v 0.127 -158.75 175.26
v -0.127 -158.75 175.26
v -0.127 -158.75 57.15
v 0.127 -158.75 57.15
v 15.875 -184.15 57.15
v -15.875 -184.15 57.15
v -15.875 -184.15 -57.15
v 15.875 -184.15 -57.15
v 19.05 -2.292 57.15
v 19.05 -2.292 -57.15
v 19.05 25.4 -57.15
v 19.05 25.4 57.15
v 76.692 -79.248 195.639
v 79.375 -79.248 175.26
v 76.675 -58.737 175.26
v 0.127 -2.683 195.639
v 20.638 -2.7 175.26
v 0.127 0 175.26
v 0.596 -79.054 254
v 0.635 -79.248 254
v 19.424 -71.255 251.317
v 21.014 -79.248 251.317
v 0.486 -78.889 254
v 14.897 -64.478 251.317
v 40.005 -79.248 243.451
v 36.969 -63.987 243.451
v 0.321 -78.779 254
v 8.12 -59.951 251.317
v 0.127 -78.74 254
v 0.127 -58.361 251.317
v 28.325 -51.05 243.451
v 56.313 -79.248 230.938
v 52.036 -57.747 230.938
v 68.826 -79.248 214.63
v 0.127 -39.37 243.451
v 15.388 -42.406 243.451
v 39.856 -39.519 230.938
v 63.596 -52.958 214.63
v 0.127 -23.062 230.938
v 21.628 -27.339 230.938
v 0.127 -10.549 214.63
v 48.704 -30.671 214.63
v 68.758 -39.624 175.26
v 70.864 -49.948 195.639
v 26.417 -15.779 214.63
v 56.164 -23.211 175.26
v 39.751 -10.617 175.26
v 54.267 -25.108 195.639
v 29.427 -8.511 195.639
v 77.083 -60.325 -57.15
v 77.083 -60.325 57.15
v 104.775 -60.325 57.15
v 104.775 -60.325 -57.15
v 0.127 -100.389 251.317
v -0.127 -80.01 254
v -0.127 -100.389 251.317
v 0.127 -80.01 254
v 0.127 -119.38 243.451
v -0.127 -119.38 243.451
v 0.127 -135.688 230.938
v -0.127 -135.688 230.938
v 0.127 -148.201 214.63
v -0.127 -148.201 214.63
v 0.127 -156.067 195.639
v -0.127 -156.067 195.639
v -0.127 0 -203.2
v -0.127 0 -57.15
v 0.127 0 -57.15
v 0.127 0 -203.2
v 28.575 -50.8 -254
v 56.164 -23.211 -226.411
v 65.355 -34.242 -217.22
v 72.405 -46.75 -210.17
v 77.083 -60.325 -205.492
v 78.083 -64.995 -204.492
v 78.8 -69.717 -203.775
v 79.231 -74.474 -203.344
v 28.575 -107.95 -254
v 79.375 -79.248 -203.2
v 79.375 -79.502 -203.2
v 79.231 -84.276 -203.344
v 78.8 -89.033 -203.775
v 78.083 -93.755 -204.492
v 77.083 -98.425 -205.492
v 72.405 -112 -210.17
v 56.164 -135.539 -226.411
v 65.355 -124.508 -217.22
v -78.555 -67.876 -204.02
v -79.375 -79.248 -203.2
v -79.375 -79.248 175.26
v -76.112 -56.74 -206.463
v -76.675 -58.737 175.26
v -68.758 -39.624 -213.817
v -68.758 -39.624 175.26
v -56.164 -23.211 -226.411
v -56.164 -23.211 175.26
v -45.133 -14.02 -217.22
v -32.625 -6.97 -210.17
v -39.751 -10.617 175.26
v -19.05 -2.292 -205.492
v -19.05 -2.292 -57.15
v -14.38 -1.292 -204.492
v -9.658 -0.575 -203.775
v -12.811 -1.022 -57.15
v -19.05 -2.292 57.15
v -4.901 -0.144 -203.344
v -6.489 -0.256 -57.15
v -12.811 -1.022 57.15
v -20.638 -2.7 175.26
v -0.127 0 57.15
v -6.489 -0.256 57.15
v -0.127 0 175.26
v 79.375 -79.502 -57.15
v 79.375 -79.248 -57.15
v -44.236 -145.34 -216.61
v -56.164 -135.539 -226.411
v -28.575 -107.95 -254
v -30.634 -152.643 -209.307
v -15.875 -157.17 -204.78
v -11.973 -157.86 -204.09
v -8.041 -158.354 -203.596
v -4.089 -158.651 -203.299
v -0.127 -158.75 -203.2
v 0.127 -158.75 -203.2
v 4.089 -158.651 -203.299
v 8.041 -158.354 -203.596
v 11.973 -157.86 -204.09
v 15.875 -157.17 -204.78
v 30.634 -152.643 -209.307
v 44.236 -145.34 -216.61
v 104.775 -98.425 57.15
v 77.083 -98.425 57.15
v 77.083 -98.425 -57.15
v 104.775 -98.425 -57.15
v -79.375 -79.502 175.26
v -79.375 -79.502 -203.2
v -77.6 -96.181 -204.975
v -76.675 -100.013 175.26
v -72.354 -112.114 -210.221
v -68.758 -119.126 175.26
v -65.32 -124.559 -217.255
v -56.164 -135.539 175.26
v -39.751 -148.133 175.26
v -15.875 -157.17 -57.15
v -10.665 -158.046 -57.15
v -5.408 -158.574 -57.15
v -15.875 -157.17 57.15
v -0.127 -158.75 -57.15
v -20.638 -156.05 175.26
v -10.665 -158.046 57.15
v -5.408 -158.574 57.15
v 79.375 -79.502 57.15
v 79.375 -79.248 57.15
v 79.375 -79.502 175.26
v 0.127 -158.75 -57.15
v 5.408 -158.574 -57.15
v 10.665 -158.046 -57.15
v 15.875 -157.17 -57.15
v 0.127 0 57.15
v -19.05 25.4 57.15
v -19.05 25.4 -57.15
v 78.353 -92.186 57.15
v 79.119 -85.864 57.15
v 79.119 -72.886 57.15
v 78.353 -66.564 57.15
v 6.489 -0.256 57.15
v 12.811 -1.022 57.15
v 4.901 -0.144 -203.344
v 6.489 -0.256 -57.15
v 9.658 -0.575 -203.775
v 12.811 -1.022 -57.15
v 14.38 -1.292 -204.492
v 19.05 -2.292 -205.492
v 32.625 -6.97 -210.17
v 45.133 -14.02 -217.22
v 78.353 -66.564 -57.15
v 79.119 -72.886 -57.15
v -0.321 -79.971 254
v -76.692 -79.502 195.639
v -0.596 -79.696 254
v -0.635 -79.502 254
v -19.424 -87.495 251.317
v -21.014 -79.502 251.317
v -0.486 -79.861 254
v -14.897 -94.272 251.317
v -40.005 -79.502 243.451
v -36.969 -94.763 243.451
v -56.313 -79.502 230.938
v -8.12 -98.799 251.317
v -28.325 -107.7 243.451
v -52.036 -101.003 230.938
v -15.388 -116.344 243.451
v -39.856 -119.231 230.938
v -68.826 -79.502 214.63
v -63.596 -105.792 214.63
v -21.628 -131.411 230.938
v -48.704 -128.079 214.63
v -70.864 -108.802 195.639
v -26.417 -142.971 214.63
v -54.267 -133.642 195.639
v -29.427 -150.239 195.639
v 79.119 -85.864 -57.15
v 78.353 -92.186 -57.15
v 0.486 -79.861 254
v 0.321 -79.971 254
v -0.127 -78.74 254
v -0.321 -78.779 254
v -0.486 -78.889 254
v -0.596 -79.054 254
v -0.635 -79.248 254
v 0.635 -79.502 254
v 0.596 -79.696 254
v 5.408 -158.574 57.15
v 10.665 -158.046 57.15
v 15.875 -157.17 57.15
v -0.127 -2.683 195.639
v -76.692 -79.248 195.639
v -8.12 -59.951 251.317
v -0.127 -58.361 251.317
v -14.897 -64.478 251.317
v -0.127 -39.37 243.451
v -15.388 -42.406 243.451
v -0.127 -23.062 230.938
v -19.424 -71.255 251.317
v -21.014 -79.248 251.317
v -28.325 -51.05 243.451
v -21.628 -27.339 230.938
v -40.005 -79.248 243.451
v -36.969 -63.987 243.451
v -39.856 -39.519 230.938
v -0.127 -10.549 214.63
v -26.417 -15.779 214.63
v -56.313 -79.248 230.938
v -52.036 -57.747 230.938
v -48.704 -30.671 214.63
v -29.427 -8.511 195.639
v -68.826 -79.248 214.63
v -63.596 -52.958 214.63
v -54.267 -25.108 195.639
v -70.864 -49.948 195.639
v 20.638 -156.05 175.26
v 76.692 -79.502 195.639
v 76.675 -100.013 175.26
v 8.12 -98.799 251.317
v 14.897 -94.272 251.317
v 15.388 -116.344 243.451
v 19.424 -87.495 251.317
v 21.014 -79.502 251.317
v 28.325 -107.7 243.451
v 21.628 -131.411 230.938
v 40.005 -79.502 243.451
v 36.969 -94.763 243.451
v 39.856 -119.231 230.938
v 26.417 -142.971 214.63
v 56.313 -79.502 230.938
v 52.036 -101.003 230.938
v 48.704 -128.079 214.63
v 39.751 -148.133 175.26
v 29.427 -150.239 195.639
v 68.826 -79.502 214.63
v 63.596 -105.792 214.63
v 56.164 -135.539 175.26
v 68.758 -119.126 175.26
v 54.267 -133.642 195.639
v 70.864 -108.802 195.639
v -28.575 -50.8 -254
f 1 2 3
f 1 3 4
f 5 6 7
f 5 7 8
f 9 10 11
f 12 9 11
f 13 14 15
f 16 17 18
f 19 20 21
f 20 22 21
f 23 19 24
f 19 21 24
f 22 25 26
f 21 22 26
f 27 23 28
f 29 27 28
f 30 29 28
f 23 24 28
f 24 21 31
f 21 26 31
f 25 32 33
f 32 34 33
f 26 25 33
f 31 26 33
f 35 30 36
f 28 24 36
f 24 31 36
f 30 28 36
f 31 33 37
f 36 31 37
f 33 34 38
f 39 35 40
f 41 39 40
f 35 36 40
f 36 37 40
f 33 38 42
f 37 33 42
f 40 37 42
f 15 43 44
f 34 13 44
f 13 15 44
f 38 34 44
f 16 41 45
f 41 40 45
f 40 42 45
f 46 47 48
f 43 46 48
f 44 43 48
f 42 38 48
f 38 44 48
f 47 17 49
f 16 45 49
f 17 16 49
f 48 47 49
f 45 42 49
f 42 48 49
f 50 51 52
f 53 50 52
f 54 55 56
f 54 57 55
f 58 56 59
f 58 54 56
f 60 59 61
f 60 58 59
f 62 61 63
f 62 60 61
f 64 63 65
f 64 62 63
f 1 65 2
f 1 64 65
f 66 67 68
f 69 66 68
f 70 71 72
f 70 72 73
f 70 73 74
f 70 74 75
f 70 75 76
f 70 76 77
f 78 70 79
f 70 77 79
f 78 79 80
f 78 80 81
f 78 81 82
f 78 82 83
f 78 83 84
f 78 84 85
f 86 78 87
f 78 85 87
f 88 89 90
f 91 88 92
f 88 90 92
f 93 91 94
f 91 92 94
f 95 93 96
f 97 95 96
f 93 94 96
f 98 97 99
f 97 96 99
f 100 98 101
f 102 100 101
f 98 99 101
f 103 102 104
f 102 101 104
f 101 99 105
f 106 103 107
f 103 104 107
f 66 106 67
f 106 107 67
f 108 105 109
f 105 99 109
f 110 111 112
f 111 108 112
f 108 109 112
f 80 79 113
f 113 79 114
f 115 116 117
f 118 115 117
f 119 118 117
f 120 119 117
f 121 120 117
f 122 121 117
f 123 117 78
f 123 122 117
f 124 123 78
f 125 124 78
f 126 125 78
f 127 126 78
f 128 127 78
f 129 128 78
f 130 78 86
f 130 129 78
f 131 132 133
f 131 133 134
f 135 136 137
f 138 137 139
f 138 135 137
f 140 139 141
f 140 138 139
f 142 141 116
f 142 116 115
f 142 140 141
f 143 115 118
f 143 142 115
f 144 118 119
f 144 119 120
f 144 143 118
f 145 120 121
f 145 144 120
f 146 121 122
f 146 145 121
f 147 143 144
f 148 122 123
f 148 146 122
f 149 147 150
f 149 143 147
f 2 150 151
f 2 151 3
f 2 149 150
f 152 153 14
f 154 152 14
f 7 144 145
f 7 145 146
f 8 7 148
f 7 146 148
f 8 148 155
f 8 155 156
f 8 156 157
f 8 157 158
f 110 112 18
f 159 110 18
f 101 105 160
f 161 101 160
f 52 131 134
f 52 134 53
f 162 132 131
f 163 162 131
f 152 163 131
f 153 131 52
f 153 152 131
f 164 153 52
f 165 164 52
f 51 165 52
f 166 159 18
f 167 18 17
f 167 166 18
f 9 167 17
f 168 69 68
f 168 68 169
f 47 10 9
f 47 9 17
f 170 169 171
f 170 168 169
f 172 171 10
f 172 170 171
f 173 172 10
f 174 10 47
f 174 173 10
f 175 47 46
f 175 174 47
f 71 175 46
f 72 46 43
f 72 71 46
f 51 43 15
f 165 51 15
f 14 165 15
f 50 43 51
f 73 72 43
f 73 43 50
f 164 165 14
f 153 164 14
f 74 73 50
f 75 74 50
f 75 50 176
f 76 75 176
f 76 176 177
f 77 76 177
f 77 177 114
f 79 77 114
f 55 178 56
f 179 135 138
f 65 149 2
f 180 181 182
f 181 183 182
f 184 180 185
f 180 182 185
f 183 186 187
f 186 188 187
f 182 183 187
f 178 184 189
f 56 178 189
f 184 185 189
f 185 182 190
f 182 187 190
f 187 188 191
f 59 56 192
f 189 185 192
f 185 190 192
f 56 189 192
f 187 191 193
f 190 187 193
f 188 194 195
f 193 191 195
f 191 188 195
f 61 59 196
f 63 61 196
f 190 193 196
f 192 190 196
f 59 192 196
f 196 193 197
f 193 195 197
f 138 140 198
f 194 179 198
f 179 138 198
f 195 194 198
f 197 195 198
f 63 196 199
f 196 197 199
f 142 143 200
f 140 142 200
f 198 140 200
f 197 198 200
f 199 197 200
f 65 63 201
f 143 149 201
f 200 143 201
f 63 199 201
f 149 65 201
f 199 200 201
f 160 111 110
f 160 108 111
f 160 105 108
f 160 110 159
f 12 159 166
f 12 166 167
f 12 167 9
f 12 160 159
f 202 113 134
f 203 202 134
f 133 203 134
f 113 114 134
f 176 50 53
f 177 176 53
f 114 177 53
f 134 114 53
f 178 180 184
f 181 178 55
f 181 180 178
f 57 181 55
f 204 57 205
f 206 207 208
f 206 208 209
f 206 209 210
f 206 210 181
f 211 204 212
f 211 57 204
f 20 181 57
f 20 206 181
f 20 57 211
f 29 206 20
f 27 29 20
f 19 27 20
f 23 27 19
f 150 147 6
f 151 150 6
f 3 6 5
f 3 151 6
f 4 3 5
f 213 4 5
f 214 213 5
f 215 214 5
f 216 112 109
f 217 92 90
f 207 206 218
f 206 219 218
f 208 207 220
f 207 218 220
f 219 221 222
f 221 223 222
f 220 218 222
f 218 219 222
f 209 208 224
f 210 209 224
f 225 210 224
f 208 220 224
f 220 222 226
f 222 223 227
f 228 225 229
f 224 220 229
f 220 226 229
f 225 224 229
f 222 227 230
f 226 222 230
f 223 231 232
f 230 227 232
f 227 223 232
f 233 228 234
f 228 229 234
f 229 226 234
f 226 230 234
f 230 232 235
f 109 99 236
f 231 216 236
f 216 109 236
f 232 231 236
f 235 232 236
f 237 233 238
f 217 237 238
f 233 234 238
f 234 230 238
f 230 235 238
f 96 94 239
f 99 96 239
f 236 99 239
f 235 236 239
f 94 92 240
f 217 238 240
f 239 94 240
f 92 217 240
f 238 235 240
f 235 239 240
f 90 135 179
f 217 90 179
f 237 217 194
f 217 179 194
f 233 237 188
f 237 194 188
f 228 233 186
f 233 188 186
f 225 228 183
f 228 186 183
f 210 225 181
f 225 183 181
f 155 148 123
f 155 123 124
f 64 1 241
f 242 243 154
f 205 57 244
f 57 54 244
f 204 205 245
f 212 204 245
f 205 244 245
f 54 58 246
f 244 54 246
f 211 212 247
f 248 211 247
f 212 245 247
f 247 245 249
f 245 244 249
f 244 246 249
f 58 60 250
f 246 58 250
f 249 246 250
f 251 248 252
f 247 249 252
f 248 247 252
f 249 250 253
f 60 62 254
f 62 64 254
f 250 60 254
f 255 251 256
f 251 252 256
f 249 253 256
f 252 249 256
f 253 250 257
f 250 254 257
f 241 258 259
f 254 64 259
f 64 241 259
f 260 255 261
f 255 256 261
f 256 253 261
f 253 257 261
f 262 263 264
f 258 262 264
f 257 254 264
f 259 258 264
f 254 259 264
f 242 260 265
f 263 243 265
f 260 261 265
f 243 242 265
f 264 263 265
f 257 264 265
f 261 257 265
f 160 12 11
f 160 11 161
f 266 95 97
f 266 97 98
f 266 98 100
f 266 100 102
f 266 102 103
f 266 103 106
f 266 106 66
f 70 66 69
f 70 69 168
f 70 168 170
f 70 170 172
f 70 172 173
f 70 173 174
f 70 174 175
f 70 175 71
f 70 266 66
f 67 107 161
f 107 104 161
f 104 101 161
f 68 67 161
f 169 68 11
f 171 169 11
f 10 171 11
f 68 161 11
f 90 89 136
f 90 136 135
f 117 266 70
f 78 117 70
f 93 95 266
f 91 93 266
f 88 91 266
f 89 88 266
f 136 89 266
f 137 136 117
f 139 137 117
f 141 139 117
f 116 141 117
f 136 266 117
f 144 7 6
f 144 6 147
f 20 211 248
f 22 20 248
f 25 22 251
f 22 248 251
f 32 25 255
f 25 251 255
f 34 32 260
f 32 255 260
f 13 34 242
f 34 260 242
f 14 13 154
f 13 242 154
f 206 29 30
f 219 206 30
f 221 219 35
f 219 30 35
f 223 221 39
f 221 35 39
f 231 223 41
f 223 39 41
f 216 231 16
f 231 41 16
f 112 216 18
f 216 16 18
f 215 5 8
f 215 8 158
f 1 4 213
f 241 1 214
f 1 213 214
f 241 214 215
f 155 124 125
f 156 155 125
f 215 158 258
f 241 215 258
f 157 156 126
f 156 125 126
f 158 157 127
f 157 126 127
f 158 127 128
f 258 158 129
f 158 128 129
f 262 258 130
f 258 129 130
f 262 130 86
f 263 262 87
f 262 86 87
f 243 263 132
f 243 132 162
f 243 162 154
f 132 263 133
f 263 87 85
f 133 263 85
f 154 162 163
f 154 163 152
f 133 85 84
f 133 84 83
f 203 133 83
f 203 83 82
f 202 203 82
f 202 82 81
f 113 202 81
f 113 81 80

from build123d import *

# Parameters (mm, degrees)
F0_W          = 158.75
F0_H          = 508
F1_DEPTH      = 158.75
F3_W          = 38.1
F3_H          = 114.3
F4_DEPTH      = 25.4
F2_W          = 31.75
F2_H          = 114.3
F5_DEPTH      = 25.4
F6_R          = 78.74
F7_SIZE       = 50.8
F8_W          = 38.1
F8_H          = 114.3
F9_DEPTH      = 25.4
F10_T2_ANGLE  = 90
F10_T4_ANGLE  = 90
F10_T6_ANGLE  = 90
F10_T8_ANGLE  = 90
F10_T12_DEPTH = 655.32
F10_T17_DEPTH = 655.32
F10_T23_DEPTH = 655.32
F10_T28_DEPTH = 655.32
F10_T33_DEPTH = 655.32
F10_T38_DEPTH = 655.32
F10_T43_DEPTH = 655.32
F10_T48_DEPTH = 655.32
F10_T53_DEPTH = 655.32
F10_T58_DEPTH = 655.32
F10_T63_DEPTH = 655.32
F10_T69_DEPTH = 655.32


# Not quite as in the source:
# - a fillet or chamfer that OpenCascade refuses, or shapes differently, is made with other operations: its cross-section is extruded or revolved along the edge and cut away or added


with BuildPart() as f1:
    # F0 (on Front) → F1 (new body)
    with BuildSketch(Plane.XZ):
        Rectangle(F0_W, F0_H)
    extrude(amount=F1_DEPTH)

    # F3 (on face) → F4 (join)
    with BuildSketch(Plane.YZ.offset(79.375)):
        with Locations((-79.375, 0)):
            Rectangle(F3_W, F3_H)
    extrude(amount=F4_DEPTH)

    # F2 (on face) → F5 (join)
    with BuildSketch(Plane.XZ.offset(158.75)):
        Rectangle(F2_W, F2_H)
    extrude(amount=F5_DEPTH)

    # F6
    f6_edges = [f1.edges().sort_by_distance(p)[0] for p in [
        (79.375, -79.375, 254),
        (-79.375, -79.375, 254),
        (0, 0, 254),
        (0, -158.75, 254),
    ]]
    fillet(f6_edges, radius=F6_R)

    # F7
    f7_edges = [f1.edges().sort_by_distance(p)[0] for p in [
        (-79.375, -79.375, -254),
        (79.375, -79.375, -254),
        (0, 0, -254),
        (0, -158.75, -254),
    ]]
    chamfer(f7_edges, length=F7_SIZE)

    # F8 (on face) → F9 (join)
    with BuildSketch(Plane(origin=(0, 0, 0), x_dir=(-1, 0, 0), z_dir=(0, 1, 0))):
        Rectangle(F8_W, F8_H)
    extrude(amount=F9_DEPTH)

    # F10: fillet of radius 79.248 on 4 edges, made by hand

    # F10_s1 → F10_t2 (revolve, cut)
    with BuildSketch(Plane.YZ.offset(0.127)):
        with BuildLine():
            ThreePointArc((-80.01, 254), (-135.6875879506, 230.9375879506), (-158.75, 175.26))
            Line((-158.75, 175.26), (-158.75, 254))
            Line((-158.75, 254), (-80.01, 254))
        make_face()
    revolve(axis=Axis((0.127, -79.502, 254), (0, 0, 1)), revolution_arc=F10_T2_ANGLE, mode=Mode.SUBTRACT)

    # F10_s3 → F10_t4 (revolve, cut)
    with BuildSketch(Plane.YZ.offset(-0.127)):
        with BuildLine():
            ThreePointArc((-78.74, 254), (-23.0624120494, 230.9375879506), (0, 175.26))
            Line((0, 175.26), (0, 254))
            Line((0, 254), (-78.74, 254))
        make_face()
    revolve(axis=Axis((-0.127, -79.248, 254), (0, 0, 1)), revolution_arc=F10_T4_ANGLE, mode=Mode.SUBTRACT)

    # F10_s5 → F10_t6 (revolve, cut)
    with BuildSketch(Plane.XZ.offset(79.502)):
        with BuildLine():
            ThreePointArc((-0.635, 254), (-56.3125879506, 230.9375879506), (-79.375, 175.26))
            Line((-79.375, 175.26), (-79.375, 254))
            Line((-79.375, 254), (-0.635, 254))
        make_face()
    revolve(axis=Axis((-0.127, -79.502, 254), (0, 0, 1)), revolution_arc=F10_T6_ANGLE, mode=Mode.SUBTRACT)

    # F10_s7 → F10_t8 (revolve, cut)
    with BuildSketch(Plane.XZ.offset(79.248)):
        with BuildLine():
            ThreePointArc((0.635, 254), (56.3125879506, 230.9375879506), (79.375, 175.26))
            Line((79.375, 175.26), (79.375, 254))
            Line((79.375, 254), (0.635, 254))
        make_face()
    revolve(axis=Axis((0.127, -79.248, 254), (0, 0, 1)), revolution_arc=F10_T8_ANGLE, mode=Mode.SUBTRACT)


with BuildPart() as f10_tool10:
    # F10_s11 → F10_t12 (new body)
    with BuildSketch(Plane.XY.offset(-401.32)):
        with BuildLine():
            ThreePointArc((0.127, 0), (56.1637981955, -23.2112018045), (79.375, -79.248))
            Line((79.375, -79.248), (79.375, 0))
            Line((79.375, 0), (0.127, 0))
        make_face()
    extrude(amount=F10_T12_DEPTH)

    split(bisect_by=Plane.XY.offset(-57.15), keep=Keep.BOTTOM)


with BuildPart() as f1_1:
    add(f1.part)

    # F10_t9: cut F10_tool10
    add(f10_tool10.part, mode=Mode.SUBTRACT)


with BuildPart() as f10_tool15:
    # F10_s16 → F10_t17 (new body)
    with BuildSketch(Plane.XY.offset(-401.32)):
        with BuildLine():
            ThreePointArc((0.127, 0), (56.1637981955, -23.2112018045), (79.375, -79.248))
            Line((79.375, -79.248), (79.375, 0))
            Line((79.375, 0), (0.127, 0))
        make_face()
    extrude(amount=F10_T17_DEPTH)

    split(bisect_by=Plane.YZ.offset(19.05), keep=Keep.TOP)

    split(bisect_by=Plane.XZ.offset(60.325), keep=Keep.BOTTOM)


with BuildPart() as f1_2:
    add(f1_1.part)

    # F10_t14: cut F10_tool15
    add(f10_tool15.part, mode=Mode.SUBTRACT)


with BuildPart() as f10_tool21:
    # F10_s22 → F10_t23 (new body)
    with BuildSketch(Plane.XY.offset(-401.32)):
        with BuildLine():
            ThreePointArc((0.127, 0), (56.1637981955, -23.2112018045), (79.375, -79.248))
            Line((79.375, -79.248), (79.375, 0))
            Line((79.375, 0), (0.127, 0))
        make_face()
    extrude(amount=F10_T23_DEPTH)

    split(bisect_by=Plane.XY.offset(57.15), keep=Keep.TOP)


with BuildPart() as f1_3:
    add(f1_2.part)

    # F10_t20: cut F10_tool21
    add(f10_tool21.part, mode=Mode.SUBTRACT)


with BuildPart() as f10_tool26:
    # F10_s27 → F10_t28 (new body)
    with BuildSketch(Plane.XY.offset(254)):
        with BuildLine():
            ThreePointArc((-79.375, -79.502), (-56.1637981955, -135.5387981955), (-0.127, -158.75))
            Line((-0.127, -158.75), (-79.375, -158.75))
            Line((-79.375, -158.75), (-79.375, -79.502))
        make_face()
    extrude(amount=-F10_T28_DEPTH)

    split(bisect_by=Plane.XY.offset(57.15), keep=Keep.TOP)


with BuildPart() as f1_4:
    add(f1_3.part)

    # F10_t25: cut F10_tool26
    add(f10_tool26.part, mode=Mode.SUBTRACT)


with BuildPart() as f10_tool31:
    # F10_s32 → F10_t33 (new body)
    with BuildSketch(Plane.XY.offset(254)):
        with BuildLine():
            ThreePointArc((-79.375, -79.502), (-56.1637981955, -135.5387981955), (-0.127, -158.75))
            Line((-0.127, -158.75), (-79.375, -158.75))
            Line((-79.375, -158.75), (-79.375, -79.502))
        make_face()
    extrude(amount=-F10_T33_DEPTH)

    split(bisect_by=Plane.YZ.offset(-15.875), keep=Keep.BOTTOM)


with BuildPart() as f1_5:
    add(f1_4.part)

    # F10_t30: cut F10_tool31
    add(f10_tool31.part, mode=Mode.SUBTRACT)


with BuildPart() as f10_tool36:
    # F10_s37 → F10_t38 (new body)
    with BuildSketch(Plane.XY.offset(254)):
        with BuildLine():
            ThreePointArc((-79.375, -79.502), (-56.1637981955, -135.5387981955), (-0.127, -158.75))
            Line((-0.127, -158.75), (-79.375, -158.75))
            Line((-79.375, -158.75), (-79.375, -79.502))
        make_face()
    extrude(amount=-F10_T38_DEPTH)

    split(bisect_by=Plane.XY.offset(-57.15), keep=Keep.BOTTOM)


with BuildPart() as f1_6:
    add(f1_5.part)

    # F10_t35: cut F10_tool36
    add(f10_tool36.part, mode=Mode.SUBTRACT)


with BuildPart() as f10_tool41:
    # F10_s42 → F10_t43 (new body)
    with BuildSketch(Plane.XY.offset(254)):
        with BuildLine():
            ThreePointArc((-79.375, -79.248), (-56.1637981955, -23.2112018045), (-0.127, 0))
            Line((-0.127, 0), (-79.375, 0))
            Line((-79.375, 0), (-79.375, -79.248))
        make_face()
    extrude(amount=-F10_T43_DEPTH)

    split(bisect_by=Plane.XY.offset(57.15), keep=Keep.TOP)


with BuildPart() as f1_7:
    add(f1_6.part)

    # F10_t40: cut F10_tool41
    add(f10_tool41.part, mode=Mode.SUBTRACT)


with BuildPart() as f10_tool46:
    # F10_s47 → F10_t48 (new body)
    with BuildSketch(Plane.XY.offset(254)):
        with BuildLine():
            ThreePointArc((-79.375, -79.248), (-56.1637981955, -23.2112018045), (-0.127, 0))
            Line((-0.127, 0), (-79.375, 0))
            Line((-79.375, 0), (-79.375, -79.248))
        make_face()
    extrude(amount=-F10_T48_DEPTH)

    split(bisect_by=Plane.YZ.offset(-19.05), keep=Keep.BOTTOM)


with BuildPart() as f1_8:
    add(f1_7.part)

    # F10_t45: cut F10_tool46
    add(f10_tool46.part, mode=Mode.SUBTRACT)


with BuildPart() as f10_tool51:
    # F10_s52 → F10_t53 (new body)
    with BuildSketch(Plane.XY.offset(254)):
        with BuildLine():
            ThreePointArc((-79.375, -79.248), (-56.1637981955, -23.2112018045), (-0.127, 0))
            Line((-0.127, 0), (-79.375, 0))
            Line((-79.375, 0), (-79.375, -79.248))
        make_face()
    extrude(amount=-F10_T53_DEPTH)

    split(bisect_by=Plane.XY.offset(-57.15), keep=Keep.BOTTOM)


with BuildPart() as f1_9:
    add(f1_8.part)

    # F10_t50: cut F10_tool51
    add(f10_tool51.part, mode=Mode.SUBTRACT)


with BuildPart() as f10_tool56:
    # F10_s57 → F10_t58 (new body)
    with BuildSketch(Plane.XY.offset(-401.32)):
        with BuildLine():
            ThreePointArc((0.127, -158.75), (56.1637981955, -135.5387981955), (79.375, -79.502))
            Line((79.375, -79.502), (79.375, -158.75))
            Line((79.375, -158.75), (0.127, -158.75))
        make_face()
    extrude(amount=F10_T58_DEPTH)

    split(bisect_by=Plane.XY.offset(-57.15), keep=Keep.BOTTOM)


with BuildPart() as f1_10:
    add(f1_9.part)

    # F10_t55: cut F10_tool56
    add(f10_tool56.part, mode=Mode.SUBTRACT)


with BuildPart() as f10_tool61:
    # F10_s62 → F10_t63 (new body)
    with BuildSketch(Plane.XY.offset(-401.32)):
        with BuildLine():
            ThreePointArc((0.127, -158.75), (56.1637981955, -135.5387981955), (79.375, -79.502))
            Line((79.375, -79.502), (79.375, -158.75))
            Line((79.375, -158.75), (0.127, -158.75))
        make_face()
    extrude(amount=F10_T63_DEPTH)

    split(bisect_by=Plane.YZ.offset(15.875), keep=Keep.TOP)

    split(bisect_by=Plane.XZ.offset(98.425), keep=Keep.TOP)


with BuildPart() as f1_11:
    add(f1_10.part)

    # F10_t60: cut F10_tool61
    add(f10_tool61.part, mode=Mode.SUBTRACT)


with BuildPart() as f10_tool67:
    # F10_s68 → F10_t69 (new body)
    with BuildSketch(Plane.XY.offset(-401.32)):
        with BuildLine():
            ThreePointArc((0.127, -158.75), (56.1637981955, -135.5387981955), (79.375, -79.502))
            Line((79.375, -79.502), (79.375, -158.75))
            Line((79.375, -158.75), (0.127, -158.75))
        make_face()
    extrude(amount=F10_T69_DEPTH)

    split(bisect_by=Plane.XY.offset(57.15), keep=Keep.TOP)


with BuildPart() as f1_12:
    add(f1_11.part)

    # F10_t66: cut F10_tool67
    add(f10_tool67.part, mode=Mode.SUBTRACT)


solid = f1_12.part
